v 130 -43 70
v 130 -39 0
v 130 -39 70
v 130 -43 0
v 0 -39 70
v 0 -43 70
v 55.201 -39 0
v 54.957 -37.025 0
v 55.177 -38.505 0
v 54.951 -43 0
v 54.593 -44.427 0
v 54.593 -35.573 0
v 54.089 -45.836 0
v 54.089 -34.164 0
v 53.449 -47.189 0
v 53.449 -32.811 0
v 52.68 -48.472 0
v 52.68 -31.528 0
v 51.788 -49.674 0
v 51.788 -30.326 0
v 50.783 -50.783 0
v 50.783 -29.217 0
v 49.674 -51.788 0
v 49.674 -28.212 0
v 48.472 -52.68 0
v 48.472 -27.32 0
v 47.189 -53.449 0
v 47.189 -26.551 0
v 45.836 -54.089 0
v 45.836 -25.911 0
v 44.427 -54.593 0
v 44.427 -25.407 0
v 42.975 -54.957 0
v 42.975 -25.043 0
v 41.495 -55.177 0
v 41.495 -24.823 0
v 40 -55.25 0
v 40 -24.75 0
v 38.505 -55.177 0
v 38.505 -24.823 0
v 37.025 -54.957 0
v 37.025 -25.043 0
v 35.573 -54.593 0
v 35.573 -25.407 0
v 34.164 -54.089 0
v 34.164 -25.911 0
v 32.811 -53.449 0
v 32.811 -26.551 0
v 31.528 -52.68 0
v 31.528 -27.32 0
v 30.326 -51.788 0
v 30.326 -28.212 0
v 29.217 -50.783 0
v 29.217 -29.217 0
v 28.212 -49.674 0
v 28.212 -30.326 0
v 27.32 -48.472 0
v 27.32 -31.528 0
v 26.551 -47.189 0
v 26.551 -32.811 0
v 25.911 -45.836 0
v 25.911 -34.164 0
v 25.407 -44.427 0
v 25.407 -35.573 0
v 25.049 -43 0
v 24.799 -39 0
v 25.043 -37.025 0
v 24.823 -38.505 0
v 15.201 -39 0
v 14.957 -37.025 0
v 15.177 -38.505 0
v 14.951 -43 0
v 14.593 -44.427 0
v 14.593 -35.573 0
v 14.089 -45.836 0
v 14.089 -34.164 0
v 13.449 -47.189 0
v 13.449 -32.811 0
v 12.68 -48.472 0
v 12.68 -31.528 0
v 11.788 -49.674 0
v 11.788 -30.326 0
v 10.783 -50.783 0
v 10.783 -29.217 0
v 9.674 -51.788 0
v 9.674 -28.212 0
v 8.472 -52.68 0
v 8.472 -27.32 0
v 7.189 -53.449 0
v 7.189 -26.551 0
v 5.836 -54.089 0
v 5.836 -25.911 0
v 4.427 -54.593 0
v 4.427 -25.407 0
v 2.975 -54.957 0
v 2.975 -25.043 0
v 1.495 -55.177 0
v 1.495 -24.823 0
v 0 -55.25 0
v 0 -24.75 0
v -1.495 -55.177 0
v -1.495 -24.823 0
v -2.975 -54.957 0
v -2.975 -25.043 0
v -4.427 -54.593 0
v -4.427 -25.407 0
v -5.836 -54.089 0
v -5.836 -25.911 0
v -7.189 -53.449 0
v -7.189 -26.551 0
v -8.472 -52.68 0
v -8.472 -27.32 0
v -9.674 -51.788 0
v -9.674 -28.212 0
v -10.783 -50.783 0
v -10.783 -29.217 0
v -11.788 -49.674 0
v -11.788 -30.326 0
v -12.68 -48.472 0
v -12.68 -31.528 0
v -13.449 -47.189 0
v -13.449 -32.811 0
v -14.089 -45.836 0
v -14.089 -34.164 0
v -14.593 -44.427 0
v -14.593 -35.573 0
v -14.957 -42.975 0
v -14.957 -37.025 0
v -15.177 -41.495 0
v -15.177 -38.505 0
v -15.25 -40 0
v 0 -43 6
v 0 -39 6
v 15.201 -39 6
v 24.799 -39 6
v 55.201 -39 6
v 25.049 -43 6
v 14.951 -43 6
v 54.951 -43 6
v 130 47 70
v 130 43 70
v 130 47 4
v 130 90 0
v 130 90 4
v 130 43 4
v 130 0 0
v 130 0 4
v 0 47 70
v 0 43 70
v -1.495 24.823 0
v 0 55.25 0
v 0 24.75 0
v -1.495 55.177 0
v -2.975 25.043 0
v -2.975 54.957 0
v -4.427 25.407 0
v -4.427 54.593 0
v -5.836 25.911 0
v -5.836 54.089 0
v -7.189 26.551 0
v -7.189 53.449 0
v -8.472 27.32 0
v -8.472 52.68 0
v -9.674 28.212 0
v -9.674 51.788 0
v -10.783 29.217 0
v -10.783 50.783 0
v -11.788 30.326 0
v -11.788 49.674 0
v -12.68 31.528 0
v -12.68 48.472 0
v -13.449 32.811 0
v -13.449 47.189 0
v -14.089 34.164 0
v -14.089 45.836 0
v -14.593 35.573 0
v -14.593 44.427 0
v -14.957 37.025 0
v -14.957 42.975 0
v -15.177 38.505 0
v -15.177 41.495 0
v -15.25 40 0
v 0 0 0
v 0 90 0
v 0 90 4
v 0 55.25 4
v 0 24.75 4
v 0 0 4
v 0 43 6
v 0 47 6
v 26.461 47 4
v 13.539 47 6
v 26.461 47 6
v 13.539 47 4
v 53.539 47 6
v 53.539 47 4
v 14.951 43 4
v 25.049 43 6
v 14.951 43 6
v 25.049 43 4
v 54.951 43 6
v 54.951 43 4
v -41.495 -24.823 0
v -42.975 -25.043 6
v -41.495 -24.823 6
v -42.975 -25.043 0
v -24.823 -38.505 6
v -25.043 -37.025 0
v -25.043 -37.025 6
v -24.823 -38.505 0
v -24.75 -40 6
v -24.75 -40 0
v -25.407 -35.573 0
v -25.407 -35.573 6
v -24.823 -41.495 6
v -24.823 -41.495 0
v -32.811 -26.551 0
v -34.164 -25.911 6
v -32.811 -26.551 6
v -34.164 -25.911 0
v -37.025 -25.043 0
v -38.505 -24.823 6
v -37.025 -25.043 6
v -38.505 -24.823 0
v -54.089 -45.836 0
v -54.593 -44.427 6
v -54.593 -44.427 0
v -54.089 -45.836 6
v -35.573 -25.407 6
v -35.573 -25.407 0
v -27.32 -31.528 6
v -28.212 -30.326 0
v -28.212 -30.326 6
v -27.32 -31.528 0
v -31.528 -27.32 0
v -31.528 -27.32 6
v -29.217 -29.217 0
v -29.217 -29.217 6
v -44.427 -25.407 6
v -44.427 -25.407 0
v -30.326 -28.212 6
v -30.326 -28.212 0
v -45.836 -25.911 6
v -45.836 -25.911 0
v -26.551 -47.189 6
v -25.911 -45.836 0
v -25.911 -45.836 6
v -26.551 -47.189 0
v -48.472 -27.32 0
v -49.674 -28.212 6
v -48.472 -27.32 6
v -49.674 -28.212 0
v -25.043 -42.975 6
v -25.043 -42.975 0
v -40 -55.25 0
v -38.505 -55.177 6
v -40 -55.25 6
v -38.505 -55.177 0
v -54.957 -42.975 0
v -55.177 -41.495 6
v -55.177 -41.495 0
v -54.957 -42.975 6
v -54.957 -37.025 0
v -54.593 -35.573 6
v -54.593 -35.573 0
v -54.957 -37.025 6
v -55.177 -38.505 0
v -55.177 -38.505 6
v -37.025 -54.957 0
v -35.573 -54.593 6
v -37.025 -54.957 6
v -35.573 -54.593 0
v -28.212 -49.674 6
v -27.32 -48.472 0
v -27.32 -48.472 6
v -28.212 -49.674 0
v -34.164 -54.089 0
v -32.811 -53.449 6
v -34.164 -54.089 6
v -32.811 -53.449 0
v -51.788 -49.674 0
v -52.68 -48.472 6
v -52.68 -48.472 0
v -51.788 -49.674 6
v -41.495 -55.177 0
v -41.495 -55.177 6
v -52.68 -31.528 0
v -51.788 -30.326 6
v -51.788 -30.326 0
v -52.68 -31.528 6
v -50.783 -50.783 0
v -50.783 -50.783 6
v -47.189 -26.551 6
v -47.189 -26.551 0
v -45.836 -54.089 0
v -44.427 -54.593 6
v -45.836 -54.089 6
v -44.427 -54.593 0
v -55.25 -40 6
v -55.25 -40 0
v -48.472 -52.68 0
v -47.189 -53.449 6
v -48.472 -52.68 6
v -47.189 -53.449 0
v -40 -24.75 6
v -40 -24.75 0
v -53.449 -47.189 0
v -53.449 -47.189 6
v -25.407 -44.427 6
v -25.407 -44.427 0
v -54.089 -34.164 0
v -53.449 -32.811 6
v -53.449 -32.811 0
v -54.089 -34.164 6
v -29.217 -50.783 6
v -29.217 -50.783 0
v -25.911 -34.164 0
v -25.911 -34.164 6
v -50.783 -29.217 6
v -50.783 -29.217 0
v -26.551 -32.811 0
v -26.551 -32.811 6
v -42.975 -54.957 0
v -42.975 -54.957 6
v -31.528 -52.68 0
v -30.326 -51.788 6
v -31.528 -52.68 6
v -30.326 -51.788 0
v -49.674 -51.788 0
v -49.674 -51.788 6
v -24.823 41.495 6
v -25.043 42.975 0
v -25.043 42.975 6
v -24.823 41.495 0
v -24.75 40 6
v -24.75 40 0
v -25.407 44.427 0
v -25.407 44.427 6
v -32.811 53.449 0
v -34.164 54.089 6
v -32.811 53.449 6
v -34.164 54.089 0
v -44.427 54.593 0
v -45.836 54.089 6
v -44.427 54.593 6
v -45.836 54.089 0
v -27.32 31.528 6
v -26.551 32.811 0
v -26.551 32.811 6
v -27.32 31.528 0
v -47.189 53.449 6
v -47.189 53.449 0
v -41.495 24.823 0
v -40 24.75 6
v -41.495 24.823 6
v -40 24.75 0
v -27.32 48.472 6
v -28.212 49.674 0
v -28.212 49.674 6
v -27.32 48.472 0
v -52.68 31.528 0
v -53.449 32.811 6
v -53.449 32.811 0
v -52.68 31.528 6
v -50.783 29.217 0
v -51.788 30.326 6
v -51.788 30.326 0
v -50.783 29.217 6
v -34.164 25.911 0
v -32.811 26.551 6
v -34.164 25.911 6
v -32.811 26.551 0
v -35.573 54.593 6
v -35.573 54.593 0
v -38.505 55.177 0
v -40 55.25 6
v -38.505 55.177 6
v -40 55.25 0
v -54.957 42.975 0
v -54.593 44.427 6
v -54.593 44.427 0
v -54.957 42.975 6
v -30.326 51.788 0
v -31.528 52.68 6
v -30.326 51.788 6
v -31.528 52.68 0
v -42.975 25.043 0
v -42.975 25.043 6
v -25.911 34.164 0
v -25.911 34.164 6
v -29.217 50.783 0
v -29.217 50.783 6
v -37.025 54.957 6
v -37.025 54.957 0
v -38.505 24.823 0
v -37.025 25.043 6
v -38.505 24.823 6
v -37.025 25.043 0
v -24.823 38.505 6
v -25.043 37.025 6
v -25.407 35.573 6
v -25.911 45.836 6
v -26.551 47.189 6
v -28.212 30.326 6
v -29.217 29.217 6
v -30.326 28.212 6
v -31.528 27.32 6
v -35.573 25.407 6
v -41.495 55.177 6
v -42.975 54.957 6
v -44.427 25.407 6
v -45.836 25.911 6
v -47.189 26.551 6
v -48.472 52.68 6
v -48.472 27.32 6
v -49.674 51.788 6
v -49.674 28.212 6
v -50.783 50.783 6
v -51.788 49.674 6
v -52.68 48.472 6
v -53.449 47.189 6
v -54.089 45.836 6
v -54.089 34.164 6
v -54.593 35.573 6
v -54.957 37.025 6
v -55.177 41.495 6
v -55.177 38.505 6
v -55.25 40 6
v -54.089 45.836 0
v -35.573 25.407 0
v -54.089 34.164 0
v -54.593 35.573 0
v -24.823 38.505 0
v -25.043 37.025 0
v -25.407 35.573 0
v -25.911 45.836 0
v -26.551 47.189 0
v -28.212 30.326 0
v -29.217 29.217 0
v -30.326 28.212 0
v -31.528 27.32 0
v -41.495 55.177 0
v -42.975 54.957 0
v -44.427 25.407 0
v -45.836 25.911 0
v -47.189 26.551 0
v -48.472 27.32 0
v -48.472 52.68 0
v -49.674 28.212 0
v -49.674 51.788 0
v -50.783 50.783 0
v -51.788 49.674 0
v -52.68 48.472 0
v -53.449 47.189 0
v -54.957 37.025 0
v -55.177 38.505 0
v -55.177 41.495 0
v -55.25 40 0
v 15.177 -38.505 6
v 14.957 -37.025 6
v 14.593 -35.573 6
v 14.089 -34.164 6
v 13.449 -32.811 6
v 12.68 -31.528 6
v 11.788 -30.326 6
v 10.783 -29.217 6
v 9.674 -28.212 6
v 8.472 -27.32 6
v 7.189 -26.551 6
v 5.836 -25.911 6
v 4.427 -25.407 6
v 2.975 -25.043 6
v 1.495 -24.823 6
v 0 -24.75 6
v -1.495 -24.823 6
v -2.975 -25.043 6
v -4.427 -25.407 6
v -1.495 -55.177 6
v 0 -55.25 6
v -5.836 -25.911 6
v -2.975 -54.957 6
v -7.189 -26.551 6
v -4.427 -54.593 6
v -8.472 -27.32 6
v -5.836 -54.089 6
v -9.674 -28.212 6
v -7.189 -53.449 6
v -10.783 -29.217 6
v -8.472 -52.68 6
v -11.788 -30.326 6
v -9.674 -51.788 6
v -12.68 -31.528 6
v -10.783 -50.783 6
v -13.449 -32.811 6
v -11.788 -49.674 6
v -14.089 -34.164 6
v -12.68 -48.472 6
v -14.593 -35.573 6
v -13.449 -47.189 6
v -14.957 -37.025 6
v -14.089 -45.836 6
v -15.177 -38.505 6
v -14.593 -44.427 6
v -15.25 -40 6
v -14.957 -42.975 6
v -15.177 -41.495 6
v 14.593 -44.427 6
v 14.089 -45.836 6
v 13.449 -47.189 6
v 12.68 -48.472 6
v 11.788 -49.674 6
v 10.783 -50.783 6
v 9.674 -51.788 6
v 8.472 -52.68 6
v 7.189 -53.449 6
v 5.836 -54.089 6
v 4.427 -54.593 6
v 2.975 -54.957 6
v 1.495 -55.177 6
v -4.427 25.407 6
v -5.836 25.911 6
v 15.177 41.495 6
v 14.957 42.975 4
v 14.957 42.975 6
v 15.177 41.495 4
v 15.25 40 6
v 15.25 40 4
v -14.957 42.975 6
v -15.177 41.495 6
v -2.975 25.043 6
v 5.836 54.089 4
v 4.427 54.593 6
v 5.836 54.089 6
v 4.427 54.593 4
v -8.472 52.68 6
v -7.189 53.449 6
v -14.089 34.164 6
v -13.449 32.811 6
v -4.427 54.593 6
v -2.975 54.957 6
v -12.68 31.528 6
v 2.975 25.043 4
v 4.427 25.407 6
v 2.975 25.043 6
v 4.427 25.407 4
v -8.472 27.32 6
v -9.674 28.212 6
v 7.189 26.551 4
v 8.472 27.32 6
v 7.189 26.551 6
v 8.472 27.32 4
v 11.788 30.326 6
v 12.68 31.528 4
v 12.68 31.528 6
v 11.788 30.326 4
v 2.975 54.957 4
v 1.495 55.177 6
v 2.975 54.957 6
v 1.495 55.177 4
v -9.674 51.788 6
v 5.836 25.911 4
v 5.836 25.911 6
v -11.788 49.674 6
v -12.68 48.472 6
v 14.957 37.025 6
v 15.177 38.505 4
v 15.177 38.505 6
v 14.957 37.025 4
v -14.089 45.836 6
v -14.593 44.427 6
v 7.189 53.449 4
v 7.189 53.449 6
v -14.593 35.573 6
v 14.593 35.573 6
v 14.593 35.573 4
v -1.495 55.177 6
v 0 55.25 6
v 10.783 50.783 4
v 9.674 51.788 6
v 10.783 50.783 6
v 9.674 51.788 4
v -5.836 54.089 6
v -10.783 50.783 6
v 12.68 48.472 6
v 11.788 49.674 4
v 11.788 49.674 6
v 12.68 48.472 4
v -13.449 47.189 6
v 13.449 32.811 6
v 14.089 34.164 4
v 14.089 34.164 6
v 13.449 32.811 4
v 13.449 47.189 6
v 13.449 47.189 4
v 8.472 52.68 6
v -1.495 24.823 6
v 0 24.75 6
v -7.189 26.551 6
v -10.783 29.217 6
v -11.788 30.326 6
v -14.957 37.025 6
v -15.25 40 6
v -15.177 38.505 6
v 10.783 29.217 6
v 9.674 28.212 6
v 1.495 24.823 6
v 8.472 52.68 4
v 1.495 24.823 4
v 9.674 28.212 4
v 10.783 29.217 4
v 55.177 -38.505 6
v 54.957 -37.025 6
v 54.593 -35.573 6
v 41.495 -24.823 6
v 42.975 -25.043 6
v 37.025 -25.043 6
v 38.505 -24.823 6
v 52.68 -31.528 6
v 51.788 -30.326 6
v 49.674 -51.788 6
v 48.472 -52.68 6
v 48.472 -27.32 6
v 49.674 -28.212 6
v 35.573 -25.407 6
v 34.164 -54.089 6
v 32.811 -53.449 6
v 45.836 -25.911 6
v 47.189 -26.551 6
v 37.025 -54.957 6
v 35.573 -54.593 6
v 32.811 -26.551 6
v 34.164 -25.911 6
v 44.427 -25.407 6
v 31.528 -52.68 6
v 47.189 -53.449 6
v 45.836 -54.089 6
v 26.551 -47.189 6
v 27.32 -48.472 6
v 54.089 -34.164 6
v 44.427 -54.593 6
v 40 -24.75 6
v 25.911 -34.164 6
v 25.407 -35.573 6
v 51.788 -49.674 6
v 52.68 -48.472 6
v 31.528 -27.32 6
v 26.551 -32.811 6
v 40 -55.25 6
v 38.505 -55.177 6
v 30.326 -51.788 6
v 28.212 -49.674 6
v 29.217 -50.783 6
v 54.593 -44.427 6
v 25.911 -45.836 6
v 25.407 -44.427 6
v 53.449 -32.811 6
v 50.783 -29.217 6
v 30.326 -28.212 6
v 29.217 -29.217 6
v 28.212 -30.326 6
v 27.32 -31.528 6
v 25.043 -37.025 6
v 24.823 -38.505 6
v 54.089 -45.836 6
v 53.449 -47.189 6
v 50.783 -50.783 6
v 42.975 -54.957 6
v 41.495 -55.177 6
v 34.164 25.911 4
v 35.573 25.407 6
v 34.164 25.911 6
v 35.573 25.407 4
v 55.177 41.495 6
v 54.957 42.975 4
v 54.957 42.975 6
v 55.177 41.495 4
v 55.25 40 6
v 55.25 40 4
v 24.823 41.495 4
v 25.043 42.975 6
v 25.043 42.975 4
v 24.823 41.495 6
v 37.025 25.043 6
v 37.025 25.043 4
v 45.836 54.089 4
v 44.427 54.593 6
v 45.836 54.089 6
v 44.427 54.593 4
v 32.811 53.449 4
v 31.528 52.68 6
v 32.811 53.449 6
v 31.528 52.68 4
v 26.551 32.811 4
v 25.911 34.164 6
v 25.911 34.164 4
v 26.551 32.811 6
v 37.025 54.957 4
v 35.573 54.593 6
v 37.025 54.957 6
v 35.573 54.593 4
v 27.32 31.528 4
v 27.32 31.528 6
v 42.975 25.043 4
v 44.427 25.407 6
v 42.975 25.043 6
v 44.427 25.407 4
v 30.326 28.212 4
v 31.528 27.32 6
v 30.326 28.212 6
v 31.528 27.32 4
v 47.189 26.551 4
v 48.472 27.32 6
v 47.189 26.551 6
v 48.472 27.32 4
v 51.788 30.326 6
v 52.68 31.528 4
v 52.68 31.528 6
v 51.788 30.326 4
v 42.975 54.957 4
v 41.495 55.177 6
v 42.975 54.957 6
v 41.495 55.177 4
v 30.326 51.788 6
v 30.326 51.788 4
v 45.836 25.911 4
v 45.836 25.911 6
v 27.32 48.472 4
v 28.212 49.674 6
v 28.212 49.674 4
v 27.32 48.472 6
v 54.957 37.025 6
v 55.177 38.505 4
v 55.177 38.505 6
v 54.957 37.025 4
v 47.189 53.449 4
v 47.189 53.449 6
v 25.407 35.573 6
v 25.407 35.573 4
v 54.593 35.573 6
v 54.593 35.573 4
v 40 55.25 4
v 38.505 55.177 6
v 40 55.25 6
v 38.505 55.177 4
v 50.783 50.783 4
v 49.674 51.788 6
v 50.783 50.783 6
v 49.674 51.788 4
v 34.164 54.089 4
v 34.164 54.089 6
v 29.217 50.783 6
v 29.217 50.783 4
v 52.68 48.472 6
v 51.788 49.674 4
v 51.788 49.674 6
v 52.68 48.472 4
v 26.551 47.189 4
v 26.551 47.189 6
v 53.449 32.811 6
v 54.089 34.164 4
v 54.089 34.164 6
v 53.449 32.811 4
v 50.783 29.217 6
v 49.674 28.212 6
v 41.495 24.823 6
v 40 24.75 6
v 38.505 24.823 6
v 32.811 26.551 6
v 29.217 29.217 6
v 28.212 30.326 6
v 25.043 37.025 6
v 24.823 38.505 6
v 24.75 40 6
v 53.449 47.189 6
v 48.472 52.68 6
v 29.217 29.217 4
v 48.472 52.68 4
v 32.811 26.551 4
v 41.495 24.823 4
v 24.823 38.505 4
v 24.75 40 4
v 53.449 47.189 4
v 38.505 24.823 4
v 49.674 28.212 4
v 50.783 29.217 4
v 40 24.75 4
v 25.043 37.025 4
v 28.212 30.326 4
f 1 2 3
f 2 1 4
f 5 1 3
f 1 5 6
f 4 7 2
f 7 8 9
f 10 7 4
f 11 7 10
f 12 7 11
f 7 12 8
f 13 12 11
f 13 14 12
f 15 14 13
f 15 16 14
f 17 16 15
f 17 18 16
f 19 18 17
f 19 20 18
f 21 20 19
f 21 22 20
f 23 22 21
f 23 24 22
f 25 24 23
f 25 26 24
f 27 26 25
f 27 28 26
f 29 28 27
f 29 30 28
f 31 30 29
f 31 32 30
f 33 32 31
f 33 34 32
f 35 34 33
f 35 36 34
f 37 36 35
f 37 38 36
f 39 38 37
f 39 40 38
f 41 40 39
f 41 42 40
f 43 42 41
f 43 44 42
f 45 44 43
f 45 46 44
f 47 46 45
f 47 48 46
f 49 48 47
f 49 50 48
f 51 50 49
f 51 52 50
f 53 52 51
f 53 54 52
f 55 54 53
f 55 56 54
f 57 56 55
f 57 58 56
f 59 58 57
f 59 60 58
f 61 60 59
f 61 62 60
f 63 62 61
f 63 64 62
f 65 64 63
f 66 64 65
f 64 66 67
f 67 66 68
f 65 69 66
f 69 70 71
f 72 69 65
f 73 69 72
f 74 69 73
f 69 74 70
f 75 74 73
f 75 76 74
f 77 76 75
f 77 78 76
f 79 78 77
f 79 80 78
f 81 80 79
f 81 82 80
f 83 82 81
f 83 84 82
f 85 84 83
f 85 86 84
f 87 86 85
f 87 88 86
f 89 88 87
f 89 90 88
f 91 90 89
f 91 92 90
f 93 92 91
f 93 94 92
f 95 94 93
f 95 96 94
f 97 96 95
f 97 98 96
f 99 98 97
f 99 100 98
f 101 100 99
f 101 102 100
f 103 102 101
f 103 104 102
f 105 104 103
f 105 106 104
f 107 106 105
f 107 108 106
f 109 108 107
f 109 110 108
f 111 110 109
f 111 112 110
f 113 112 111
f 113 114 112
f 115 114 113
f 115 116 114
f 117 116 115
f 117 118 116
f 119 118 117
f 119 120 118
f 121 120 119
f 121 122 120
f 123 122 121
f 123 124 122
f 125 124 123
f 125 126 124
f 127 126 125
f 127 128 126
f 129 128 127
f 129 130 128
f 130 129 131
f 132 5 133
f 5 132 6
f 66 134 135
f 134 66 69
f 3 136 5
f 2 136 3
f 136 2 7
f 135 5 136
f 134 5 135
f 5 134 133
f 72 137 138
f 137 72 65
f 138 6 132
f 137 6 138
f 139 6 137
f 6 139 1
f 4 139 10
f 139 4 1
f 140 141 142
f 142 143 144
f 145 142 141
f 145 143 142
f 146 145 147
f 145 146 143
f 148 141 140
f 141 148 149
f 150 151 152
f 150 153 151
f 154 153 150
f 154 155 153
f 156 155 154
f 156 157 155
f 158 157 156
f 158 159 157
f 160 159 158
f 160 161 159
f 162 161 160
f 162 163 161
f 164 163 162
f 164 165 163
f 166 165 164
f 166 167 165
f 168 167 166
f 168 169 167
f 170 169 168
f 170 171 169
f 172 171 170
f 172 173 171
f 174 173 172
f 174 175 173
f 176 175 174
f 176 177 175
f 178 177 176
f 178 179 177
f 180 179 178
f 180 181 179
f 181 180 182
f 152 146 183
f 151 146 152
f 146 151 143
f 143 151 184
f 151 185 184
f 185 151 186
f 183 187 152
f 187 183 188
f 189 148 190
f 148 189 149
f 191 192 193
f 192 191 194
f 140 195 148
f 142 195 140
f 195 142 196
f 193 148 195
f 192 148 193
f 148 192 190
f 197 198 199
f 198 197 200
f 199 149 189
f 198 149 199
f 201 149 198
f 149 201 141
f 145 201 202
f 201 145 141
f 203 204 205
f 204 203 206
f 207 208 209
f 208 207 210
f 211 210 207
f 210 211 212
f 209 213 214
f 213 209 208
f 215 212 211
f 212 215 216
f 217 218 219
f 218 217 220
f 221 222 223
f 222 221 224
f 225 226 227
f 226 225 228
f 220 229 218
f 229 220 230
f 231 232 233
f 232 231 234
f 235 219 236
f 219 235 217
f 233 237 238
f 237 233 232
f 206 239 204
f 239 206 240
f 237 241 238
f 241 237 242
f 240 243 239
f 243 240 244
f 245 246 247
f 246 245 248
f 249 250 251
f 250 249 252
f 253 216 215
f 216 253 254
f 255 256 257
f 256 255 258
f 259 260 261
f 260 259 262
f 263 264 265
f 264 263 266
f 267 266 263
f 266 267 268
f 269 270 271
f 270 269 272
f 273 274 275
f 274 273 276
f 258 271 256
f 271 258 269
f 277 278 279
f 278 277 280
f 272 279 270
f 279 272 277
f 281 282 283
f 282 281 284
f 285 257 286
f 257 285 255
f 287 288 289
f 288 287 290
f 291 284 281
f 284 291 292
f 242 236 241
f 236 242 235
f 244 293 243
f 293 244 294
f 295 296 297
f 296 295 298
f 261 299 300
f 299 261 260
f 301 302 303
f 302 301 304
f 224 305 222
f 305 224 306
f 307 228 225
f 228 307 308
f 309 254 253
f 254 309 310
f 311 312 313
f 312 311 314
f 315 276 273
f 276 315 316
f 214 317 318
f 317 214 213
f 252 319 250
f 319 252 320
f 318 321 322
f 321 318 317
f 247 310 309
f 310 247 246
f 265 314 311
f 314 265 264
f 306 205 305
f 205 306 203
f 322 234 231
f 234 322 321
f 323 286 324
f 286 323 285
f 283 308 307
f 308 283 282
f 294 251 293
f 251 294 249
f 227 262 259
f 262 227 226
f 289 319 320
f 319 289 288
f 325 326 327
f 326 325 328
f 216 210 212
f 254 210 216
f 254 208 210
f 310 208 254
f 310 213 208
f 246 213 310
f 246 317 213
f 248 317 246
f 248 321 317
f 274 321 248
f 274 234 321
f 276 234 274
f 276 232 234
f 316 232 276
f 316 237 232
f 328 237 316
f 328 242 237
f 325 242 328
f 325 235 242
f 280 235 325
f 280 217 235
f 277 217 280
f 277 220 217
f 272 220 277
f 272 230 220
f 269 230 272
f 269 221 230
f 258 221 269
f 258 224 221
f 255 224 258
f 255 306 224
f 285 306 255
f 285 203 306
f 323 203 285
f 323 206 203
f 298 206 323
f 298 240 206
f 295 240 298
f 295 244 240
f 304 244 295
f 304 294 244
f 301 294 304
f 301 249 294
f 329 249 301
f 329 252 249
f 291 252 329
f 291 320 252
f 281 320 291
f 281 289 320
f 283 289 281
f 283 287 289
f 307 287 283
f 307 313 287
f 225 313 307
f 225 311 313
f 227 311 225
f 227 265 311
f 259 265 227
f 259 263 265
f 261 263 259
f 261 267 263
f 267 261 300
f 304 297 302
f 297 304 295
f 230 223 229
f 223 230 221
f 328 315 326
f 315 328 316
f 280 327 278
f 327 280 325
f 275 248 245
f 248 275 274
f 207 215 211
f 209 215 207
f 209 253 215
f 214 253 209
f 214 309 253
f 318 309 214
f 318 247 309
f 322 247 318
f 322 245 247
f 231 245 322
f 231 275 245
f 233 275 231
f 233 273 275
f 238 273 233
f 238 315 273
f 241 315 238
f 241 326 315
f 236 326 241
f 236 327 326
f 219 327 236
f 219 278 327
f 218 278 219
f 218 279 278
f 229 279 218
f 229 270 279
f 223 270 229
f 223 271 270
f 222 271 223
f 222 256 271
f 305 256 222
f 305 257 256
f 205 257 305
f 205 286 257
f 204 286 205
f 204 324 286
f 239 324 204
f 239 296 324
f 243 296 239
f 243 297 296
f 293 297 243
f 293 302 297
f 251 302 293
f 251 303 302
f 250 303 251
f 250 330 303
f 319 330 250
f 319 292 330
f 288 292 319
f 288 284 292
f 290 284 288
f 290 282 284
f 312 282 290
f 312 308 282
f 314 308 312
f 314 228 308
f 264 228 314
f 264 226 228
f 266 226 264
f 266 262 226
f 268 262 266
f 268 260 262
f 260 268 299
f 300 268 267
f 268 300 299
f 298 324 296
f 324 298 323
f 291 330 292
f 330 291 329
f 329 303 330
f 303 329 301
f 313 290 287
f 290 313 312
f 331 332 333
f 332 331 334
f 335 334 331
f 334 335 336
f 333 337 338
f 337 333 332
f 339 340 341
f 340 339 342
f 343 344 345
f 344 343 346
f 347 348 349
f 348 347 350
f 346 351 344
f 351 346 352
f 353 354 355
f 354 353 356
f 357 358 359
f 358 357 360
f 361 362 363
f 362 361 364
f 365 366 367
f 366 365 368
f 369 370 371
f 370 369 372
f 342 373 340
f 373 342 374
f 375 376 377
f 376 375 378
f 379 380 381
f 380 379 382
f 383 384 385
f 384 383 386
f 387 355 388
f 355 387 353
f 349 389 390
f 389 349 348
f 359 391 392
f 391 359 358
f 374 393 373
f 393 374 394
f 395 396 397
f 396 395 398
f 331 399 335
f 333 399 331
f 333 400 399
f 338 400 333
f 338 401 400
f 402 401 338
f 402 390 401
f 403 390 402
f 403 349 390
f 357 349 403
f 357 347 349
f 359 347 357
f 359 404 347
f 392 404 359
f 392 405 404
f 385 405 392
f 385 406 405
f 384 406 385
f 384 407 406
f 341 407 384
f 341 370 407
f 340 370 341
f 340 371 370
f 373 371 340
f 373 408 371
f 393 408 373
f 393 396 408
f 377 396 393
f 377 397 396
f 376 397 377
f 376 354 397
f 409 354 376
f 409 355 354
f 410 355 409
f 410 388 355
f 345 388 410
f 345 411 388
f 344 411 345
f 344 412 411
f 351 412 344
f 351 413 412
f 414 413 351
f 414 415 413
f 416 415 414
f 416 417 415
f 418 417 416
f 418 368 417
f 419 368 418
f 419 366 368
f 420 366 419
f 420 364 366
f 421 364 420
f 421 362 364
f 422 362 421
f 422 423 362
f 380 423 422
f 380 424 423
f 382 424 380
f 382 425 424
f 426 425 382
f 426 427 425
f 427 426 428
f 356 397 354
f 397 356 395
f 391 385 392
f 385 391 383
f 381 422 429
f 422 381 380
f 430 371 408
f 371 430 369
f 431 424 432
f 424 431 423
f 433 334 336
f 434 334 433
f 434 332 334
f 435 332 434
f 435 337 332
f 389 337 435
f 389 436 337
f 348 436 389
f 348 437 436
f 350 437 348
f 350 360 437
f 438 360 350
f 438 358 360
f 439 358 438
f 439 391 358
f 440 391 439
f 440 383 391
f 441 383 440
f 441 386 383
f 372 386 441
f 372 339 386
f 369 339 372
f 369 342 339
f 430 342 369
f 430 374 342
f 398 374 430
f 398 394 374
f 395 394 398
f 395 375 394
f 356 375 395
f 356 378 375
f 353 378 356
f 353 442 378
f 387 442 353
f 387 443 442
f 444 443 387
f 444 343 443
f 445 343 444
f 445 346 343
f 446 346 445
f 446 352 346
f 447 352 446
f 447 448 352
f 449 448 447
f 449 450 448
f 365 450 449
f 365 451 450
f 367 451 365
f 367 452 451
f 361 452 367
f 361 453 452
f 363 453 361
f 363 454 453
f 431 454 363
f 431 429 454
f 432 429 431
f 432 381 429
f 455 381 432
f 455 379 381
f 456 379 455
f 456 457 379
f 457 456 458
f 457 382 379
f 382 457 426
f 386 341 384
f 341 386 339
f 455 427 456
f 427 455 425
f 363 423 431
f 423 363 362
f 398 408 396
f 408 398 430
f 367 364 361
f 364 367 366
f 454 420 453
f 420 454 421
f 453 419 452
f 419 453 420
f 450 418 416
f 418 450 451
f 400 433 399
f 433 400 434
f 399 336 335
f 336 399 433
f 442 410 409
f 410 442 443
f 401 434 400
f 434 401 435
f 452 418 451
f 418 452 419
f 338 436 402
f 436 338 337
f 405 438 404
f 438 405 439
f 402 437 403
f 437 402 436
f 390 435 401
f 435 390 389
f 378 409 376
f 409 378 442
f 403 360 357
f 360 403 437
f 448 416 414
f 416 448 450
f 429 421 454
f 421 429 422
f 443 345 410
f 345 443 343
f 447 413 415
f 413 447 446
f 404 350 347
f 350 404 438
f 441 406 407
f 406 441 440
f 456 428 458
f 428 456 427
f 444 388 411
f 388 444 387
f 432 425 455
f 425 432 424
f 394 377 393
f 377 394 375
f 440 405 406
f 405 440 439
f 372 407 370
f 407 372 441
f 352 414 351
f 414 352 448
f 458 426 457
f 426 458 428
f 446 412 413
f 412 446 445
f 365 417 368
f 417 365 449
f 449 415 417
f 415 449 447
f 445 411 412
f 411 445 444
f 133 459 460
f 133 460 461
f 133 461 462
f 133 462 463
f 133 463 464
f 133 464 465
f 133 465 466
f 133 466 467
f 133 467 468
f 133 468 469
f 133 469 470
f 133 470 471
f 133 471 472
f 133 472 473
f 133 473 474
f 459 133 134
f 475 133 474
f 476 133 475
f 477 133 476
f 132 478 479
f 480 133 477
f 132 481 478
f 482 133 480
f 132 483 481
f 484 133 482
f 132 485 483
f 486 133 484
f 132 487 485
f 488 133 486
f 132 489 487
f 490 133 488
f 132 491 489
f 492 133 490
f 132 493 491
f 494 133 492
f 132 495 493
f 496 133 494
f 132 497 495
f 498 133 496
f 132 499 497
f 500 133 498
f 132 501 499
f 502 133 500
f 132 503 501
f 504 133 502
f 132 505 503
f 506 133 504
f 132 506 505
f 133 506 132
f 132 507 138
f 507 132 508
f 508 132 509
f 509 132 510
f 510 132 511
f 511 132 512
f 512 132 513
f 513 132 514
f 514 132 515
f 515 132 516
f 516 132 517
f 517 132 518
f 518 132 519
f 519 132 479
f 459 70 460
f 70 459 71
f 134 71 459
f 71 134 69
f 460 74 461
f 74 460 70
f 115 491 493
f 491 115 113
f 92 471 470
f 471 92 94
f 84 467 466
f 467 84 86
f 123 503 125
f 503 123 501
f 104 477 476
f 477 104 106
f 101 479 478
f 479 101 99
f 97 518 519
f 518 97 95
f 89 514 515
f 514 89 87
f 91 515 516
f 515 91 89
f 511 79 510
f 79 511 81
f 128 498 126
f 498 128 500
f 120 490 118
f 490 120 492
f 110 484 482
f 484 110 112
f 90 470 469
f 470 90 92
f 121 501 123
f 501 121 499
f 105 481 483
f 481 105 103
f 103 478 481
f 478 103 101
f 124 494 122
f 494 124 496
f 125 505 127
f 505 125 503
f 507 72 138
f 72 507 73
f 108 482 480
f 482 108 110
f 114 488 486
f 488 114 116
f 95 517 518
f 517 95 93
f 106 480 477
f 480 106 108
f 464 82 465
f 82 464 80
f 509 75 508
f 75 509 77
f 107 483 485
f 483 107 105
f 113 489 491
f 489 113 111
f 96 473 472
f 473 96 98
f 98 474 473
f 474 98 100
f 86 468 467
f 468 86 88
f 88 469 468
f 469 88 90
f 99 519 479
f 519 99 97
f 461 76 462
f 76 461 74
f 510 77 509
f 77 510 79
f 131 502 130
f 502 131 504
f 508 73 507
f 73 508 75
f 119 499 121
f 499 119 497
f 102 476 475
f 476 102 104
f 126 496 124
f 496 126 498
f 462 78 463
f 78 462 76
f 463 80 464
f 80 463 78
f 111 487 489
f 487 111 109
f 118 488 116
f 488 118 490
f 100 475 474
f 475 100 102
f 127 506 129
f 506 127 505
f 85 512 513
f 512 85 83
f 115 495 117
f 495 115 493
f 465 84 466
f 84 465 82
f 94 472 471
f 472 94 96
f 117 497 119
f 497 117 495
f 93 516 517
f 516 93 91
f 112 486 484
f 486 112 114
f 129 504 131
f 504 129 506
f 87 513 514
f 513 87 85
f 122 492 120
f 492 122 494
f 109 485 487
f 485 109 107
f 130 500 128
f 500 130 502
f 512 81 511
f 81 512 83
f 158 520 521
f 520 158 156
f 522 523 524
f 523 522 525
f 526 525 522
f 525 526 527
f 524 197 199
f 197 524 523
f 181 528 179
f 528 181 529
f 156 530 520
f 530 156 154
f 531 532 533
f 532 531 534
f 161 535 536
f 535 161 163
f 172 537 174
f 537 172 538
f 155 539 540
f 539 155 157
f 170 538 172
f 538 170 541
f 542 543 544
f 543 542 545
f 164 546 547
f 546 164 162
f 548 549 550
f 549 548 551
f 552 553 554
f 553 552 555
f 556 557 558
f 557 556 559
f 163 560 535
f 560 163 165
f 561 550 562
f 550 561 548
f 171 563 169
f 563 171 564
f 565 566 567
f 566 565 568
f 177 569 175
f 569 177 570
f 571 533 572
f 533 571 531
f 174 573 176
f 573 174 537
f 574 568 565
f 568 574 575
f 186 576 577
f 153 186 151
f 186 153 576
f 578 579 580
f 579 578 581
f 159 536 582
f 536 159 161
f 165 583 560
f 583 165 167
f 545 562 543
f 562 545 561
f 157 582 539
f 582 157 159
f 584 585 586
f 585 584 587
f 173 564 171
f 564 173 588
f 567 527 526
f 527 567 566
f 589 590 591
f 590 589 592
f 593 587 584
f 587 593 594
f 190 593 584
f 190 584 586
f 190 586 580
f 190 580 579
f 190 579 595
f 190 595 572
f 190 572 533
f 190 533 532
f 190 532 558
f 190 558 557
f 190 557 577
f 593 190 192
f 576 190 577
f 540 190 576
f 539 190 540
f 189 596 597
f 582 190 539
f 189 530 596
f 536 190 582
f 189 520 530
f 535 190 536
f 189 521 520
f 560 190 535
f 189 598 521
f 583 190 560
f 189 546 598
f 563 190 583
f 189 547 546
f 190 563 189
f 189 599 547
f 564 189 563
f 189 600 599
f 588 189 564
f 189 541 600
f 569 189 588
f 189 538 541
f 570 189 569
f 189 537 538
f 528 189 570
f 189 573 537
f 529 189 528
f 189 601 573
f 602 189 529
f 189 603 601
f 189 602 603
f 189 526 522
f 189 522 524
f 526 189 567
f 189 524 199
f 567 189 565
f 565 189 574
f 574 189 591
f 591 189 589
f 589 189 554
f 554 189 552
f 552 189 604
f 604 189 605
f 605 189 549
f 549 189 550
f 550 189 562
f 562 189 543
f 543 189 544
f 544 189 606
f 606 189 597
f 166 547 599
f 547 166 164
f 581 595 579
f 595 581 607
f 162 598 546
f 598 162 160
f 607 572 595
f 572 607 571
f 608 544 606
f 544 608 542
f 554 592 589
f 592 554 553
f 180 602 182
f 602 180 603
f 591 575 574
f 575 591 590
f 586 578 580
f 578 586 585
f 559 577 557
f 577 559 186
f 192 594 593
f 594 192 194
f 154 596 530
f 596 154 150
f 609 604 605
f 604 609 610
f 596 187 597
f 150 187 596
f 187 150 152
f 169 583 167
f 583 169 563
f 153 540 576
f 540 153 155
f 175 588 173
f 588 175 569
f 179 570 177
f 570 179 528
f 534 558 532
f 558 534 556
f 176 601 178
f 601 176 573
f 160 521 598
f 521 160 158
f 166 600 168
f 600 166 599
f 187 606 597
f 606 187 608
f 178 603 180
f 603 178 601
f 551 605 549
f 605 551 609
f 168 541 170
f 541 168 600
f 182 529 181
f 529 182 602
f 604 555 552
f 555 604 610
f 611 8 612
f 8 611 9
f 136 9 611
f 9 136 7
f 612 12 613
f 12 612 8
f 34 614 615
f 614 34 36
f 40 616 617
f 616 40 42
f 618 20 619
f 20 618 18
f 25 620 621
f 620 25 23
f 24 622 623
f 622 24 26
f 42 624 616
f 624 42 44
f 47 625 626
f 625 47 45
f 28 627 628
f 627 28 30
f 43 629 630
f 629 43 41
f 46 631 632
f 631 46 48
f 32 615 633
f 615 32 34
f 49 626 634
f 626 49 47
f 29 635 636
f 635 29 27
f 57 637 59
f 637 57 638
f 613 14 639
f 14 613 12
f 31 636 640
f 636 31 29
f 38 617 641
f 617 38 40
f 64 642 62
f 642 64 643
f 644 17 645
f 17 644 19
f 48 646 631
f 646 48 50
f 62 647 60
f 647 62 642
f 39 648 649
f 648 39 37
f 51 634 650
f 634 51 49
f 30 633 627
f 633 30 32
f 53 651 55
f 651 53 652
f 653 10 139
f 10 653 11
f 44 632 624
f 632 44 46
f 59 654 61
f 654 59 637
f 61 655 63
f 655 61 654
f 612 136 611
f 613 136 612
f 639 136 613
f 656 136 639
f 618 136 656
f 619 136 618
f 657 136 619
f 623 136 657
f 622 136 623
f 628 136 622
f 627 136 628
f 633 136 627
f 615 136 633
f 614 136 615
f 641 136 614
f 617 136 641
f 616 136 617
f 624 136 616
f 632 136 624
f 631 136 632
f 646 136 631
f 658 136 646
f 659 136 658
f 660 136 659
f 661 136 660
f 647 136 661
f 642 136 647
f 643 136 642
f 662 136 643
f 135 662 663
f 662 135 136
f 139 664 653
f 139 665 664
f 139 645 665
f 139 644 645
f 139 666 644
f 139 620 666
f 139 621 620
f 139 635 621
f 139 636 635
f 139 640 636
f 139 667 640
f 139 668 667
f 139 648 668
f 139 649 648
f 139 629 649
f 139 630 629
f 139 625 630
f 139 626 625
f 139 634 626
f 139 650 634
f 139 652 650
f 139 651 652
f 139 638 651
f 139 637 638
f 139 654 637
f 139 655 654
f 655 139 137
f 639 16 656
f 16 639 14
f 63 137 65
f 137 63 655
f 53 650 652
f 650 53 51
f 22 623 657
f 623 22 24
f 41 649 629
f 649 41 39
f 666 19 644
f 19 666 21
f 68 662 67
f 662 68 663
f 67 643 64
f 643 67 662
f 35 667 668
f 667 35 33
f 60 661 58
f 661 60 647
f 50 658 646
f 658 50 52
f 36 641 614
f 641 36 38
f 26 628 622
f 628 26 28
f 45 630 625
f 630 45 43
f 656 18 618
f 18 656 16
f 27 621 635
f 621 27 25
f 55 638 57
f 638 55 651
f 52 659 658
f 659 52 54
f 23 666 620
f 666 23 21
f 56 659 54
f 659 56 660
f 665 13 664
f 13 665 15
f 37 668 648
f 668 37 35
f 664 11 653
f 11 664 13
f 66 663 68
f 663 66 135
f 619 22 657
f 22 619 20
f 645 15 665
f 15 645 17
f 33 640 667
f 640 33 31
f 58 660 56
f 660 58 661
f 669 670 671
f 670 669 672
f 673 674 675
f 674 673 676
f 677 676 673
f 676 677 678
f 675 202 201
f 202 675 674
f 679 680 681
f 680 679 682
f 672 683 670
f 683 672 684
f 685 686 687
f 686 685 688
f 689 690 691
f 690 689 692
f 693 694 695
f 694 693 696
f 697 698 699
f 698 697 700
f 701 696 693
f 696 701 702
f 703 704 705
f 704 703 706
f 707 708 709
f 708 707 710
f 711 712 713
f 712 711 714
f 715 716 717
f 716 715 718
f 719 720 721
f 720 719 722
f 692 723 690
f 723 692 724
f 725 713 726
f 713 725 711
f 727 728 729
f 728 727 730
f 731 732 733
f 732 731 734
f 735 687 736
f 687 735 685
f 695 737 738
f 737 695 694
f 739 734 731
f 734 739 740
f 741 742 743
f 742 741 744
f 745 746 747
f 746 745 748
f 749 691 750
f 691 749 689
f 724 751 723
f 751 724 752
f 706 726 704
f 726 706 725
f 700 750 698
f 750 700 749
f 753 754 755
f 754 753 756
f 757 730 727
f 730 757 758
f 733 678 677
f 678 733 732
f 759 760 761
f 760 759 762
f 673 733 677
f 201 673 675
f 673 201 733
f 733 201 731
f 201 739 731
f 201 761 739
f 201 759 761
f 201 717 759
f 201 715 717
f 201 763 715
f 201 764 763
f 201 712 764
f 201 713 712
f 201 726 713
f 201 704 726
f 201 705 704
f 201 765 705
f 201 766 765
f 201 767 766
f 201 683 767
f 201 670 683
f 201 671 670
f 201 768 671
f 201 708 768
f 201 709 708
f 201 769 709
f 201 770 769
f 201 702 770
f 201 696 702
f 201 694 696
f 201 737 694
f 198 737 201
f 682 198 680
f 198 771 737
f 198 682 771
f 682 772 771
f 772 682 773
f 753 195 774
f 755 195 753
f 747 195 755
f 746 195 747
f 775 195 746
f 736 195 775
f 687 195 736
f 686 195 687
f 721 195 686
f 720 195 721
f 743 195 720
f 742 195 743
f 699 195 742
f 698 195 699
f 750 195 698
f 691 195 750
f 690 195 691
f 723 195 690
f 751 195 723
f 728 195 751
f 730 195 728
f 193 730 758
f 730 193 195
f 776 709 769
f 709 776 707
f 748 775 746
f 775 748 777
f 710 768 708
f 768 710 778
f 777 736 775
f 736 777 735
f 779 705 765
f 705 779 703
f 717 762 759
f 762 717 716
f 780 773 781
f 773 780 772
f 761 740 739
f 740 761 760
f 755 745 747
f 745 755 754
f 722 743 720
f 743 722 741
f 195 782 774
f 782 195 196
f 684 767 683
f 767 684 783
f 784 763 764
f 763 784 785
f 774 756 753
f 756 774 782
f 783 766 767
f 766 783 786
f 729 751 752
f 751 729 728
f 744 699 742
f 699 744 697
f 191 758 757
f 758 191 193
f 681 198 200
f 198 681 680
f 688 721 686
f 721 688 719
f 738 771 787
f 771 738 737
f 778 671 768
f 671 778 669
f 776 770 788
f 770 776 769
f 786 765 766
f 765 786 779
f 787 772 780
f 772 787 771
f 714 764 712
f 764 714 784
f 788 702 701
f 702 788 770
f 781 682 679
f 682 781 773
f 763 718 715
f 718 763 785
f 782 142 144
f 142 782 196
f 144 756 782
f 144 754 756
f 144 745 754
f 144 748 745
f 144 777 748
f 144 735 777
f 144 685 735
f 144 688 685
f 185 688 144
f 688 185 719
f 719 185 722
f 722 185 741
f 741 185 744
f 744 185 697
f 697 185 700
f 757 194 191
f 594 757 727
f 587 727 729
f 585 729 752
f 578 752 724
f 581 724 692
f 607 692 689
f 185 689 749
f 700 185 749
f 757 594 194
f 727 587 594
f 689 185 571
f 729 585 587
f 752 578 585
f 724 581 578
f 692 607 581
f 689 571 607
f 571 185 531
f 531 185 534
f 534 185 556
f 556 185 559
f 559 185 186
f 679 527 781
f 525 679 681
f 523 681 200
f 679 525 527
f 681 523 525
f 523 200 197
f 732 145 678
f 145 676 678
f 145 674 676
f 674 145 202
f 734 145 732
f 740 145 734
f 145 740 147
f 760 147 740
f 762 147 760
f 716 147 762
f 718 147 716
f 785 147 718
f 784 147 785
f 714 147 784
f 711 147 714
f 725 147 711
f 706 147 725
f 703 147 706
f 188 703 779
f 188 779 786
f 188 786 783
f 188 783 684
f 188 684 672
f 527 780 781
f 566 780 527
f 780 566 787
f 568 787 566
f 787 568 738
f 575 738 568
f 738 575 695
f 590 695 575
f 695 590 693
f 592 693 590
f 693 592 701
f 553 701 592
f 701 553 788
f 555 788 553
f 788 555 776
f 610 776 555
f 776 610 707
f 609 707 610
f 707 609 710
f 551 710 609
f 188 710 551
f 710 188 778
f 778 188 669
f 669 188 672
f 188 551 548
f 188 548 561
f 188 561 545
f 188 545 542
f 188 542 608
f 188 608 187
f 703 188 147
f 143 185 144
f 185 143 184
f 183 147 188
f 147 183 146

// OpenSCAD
// 6x 50 mL conical tube rack
// Print orientation: plate on bed (z=0..4), walls rise to z=70.
// After flipping, the rack stands on the two walls and tubes pass through the holes.

// --- Dimensions (mm) ---
plate_x   = 130;   // plate length along X
plate_y   = 90;    // plate width along Y
plate_z   = 4;     // plate thickness
wall_len  = 130;   // wall length along X (same as plate_x)
wall_thk  = 4;     // wall thickness along Y
wall_hgt  = 70;    // wall height above plate (z=4 to z=70)
hole_d    = 30.5;  // tube hole diameter
hole_cx   = 40;    // hole spacing centre-to-centre along X
hole_cy   = 40;    // hole spacing centre-to-centre along Y

// --- Build ---
union() {
    // Flat plate, centred on origin in X and Y, z = 0..4
    cube([plate_x, plate_y, plate_z], center=[0, 0, plate_z/2]);

    // Two solid walls along the long edges (Y = +/- plate_y/2), z = 4..70
    for (y_dir = [-1, 1]) {
        translate([0, y_dir * (plate_y/2 - wall_thk/2), 0])
            cube([wall_len, wall_thk, wall_hgt], center=[0, 0, wall_hgt/2 + plate_z]);
    }

    // Six through-holes, 2 rows (Y) x 3 (X), centred on the plate
    for (i = [-1, 0, 1]) {
        for (j = [-1, 1]) {
            translate([i * hole_cx, j * hole_cy, 0])
                cylinder(h = plate_z + 2, d = hole_d, $fn = 64);
        }
    }
}
